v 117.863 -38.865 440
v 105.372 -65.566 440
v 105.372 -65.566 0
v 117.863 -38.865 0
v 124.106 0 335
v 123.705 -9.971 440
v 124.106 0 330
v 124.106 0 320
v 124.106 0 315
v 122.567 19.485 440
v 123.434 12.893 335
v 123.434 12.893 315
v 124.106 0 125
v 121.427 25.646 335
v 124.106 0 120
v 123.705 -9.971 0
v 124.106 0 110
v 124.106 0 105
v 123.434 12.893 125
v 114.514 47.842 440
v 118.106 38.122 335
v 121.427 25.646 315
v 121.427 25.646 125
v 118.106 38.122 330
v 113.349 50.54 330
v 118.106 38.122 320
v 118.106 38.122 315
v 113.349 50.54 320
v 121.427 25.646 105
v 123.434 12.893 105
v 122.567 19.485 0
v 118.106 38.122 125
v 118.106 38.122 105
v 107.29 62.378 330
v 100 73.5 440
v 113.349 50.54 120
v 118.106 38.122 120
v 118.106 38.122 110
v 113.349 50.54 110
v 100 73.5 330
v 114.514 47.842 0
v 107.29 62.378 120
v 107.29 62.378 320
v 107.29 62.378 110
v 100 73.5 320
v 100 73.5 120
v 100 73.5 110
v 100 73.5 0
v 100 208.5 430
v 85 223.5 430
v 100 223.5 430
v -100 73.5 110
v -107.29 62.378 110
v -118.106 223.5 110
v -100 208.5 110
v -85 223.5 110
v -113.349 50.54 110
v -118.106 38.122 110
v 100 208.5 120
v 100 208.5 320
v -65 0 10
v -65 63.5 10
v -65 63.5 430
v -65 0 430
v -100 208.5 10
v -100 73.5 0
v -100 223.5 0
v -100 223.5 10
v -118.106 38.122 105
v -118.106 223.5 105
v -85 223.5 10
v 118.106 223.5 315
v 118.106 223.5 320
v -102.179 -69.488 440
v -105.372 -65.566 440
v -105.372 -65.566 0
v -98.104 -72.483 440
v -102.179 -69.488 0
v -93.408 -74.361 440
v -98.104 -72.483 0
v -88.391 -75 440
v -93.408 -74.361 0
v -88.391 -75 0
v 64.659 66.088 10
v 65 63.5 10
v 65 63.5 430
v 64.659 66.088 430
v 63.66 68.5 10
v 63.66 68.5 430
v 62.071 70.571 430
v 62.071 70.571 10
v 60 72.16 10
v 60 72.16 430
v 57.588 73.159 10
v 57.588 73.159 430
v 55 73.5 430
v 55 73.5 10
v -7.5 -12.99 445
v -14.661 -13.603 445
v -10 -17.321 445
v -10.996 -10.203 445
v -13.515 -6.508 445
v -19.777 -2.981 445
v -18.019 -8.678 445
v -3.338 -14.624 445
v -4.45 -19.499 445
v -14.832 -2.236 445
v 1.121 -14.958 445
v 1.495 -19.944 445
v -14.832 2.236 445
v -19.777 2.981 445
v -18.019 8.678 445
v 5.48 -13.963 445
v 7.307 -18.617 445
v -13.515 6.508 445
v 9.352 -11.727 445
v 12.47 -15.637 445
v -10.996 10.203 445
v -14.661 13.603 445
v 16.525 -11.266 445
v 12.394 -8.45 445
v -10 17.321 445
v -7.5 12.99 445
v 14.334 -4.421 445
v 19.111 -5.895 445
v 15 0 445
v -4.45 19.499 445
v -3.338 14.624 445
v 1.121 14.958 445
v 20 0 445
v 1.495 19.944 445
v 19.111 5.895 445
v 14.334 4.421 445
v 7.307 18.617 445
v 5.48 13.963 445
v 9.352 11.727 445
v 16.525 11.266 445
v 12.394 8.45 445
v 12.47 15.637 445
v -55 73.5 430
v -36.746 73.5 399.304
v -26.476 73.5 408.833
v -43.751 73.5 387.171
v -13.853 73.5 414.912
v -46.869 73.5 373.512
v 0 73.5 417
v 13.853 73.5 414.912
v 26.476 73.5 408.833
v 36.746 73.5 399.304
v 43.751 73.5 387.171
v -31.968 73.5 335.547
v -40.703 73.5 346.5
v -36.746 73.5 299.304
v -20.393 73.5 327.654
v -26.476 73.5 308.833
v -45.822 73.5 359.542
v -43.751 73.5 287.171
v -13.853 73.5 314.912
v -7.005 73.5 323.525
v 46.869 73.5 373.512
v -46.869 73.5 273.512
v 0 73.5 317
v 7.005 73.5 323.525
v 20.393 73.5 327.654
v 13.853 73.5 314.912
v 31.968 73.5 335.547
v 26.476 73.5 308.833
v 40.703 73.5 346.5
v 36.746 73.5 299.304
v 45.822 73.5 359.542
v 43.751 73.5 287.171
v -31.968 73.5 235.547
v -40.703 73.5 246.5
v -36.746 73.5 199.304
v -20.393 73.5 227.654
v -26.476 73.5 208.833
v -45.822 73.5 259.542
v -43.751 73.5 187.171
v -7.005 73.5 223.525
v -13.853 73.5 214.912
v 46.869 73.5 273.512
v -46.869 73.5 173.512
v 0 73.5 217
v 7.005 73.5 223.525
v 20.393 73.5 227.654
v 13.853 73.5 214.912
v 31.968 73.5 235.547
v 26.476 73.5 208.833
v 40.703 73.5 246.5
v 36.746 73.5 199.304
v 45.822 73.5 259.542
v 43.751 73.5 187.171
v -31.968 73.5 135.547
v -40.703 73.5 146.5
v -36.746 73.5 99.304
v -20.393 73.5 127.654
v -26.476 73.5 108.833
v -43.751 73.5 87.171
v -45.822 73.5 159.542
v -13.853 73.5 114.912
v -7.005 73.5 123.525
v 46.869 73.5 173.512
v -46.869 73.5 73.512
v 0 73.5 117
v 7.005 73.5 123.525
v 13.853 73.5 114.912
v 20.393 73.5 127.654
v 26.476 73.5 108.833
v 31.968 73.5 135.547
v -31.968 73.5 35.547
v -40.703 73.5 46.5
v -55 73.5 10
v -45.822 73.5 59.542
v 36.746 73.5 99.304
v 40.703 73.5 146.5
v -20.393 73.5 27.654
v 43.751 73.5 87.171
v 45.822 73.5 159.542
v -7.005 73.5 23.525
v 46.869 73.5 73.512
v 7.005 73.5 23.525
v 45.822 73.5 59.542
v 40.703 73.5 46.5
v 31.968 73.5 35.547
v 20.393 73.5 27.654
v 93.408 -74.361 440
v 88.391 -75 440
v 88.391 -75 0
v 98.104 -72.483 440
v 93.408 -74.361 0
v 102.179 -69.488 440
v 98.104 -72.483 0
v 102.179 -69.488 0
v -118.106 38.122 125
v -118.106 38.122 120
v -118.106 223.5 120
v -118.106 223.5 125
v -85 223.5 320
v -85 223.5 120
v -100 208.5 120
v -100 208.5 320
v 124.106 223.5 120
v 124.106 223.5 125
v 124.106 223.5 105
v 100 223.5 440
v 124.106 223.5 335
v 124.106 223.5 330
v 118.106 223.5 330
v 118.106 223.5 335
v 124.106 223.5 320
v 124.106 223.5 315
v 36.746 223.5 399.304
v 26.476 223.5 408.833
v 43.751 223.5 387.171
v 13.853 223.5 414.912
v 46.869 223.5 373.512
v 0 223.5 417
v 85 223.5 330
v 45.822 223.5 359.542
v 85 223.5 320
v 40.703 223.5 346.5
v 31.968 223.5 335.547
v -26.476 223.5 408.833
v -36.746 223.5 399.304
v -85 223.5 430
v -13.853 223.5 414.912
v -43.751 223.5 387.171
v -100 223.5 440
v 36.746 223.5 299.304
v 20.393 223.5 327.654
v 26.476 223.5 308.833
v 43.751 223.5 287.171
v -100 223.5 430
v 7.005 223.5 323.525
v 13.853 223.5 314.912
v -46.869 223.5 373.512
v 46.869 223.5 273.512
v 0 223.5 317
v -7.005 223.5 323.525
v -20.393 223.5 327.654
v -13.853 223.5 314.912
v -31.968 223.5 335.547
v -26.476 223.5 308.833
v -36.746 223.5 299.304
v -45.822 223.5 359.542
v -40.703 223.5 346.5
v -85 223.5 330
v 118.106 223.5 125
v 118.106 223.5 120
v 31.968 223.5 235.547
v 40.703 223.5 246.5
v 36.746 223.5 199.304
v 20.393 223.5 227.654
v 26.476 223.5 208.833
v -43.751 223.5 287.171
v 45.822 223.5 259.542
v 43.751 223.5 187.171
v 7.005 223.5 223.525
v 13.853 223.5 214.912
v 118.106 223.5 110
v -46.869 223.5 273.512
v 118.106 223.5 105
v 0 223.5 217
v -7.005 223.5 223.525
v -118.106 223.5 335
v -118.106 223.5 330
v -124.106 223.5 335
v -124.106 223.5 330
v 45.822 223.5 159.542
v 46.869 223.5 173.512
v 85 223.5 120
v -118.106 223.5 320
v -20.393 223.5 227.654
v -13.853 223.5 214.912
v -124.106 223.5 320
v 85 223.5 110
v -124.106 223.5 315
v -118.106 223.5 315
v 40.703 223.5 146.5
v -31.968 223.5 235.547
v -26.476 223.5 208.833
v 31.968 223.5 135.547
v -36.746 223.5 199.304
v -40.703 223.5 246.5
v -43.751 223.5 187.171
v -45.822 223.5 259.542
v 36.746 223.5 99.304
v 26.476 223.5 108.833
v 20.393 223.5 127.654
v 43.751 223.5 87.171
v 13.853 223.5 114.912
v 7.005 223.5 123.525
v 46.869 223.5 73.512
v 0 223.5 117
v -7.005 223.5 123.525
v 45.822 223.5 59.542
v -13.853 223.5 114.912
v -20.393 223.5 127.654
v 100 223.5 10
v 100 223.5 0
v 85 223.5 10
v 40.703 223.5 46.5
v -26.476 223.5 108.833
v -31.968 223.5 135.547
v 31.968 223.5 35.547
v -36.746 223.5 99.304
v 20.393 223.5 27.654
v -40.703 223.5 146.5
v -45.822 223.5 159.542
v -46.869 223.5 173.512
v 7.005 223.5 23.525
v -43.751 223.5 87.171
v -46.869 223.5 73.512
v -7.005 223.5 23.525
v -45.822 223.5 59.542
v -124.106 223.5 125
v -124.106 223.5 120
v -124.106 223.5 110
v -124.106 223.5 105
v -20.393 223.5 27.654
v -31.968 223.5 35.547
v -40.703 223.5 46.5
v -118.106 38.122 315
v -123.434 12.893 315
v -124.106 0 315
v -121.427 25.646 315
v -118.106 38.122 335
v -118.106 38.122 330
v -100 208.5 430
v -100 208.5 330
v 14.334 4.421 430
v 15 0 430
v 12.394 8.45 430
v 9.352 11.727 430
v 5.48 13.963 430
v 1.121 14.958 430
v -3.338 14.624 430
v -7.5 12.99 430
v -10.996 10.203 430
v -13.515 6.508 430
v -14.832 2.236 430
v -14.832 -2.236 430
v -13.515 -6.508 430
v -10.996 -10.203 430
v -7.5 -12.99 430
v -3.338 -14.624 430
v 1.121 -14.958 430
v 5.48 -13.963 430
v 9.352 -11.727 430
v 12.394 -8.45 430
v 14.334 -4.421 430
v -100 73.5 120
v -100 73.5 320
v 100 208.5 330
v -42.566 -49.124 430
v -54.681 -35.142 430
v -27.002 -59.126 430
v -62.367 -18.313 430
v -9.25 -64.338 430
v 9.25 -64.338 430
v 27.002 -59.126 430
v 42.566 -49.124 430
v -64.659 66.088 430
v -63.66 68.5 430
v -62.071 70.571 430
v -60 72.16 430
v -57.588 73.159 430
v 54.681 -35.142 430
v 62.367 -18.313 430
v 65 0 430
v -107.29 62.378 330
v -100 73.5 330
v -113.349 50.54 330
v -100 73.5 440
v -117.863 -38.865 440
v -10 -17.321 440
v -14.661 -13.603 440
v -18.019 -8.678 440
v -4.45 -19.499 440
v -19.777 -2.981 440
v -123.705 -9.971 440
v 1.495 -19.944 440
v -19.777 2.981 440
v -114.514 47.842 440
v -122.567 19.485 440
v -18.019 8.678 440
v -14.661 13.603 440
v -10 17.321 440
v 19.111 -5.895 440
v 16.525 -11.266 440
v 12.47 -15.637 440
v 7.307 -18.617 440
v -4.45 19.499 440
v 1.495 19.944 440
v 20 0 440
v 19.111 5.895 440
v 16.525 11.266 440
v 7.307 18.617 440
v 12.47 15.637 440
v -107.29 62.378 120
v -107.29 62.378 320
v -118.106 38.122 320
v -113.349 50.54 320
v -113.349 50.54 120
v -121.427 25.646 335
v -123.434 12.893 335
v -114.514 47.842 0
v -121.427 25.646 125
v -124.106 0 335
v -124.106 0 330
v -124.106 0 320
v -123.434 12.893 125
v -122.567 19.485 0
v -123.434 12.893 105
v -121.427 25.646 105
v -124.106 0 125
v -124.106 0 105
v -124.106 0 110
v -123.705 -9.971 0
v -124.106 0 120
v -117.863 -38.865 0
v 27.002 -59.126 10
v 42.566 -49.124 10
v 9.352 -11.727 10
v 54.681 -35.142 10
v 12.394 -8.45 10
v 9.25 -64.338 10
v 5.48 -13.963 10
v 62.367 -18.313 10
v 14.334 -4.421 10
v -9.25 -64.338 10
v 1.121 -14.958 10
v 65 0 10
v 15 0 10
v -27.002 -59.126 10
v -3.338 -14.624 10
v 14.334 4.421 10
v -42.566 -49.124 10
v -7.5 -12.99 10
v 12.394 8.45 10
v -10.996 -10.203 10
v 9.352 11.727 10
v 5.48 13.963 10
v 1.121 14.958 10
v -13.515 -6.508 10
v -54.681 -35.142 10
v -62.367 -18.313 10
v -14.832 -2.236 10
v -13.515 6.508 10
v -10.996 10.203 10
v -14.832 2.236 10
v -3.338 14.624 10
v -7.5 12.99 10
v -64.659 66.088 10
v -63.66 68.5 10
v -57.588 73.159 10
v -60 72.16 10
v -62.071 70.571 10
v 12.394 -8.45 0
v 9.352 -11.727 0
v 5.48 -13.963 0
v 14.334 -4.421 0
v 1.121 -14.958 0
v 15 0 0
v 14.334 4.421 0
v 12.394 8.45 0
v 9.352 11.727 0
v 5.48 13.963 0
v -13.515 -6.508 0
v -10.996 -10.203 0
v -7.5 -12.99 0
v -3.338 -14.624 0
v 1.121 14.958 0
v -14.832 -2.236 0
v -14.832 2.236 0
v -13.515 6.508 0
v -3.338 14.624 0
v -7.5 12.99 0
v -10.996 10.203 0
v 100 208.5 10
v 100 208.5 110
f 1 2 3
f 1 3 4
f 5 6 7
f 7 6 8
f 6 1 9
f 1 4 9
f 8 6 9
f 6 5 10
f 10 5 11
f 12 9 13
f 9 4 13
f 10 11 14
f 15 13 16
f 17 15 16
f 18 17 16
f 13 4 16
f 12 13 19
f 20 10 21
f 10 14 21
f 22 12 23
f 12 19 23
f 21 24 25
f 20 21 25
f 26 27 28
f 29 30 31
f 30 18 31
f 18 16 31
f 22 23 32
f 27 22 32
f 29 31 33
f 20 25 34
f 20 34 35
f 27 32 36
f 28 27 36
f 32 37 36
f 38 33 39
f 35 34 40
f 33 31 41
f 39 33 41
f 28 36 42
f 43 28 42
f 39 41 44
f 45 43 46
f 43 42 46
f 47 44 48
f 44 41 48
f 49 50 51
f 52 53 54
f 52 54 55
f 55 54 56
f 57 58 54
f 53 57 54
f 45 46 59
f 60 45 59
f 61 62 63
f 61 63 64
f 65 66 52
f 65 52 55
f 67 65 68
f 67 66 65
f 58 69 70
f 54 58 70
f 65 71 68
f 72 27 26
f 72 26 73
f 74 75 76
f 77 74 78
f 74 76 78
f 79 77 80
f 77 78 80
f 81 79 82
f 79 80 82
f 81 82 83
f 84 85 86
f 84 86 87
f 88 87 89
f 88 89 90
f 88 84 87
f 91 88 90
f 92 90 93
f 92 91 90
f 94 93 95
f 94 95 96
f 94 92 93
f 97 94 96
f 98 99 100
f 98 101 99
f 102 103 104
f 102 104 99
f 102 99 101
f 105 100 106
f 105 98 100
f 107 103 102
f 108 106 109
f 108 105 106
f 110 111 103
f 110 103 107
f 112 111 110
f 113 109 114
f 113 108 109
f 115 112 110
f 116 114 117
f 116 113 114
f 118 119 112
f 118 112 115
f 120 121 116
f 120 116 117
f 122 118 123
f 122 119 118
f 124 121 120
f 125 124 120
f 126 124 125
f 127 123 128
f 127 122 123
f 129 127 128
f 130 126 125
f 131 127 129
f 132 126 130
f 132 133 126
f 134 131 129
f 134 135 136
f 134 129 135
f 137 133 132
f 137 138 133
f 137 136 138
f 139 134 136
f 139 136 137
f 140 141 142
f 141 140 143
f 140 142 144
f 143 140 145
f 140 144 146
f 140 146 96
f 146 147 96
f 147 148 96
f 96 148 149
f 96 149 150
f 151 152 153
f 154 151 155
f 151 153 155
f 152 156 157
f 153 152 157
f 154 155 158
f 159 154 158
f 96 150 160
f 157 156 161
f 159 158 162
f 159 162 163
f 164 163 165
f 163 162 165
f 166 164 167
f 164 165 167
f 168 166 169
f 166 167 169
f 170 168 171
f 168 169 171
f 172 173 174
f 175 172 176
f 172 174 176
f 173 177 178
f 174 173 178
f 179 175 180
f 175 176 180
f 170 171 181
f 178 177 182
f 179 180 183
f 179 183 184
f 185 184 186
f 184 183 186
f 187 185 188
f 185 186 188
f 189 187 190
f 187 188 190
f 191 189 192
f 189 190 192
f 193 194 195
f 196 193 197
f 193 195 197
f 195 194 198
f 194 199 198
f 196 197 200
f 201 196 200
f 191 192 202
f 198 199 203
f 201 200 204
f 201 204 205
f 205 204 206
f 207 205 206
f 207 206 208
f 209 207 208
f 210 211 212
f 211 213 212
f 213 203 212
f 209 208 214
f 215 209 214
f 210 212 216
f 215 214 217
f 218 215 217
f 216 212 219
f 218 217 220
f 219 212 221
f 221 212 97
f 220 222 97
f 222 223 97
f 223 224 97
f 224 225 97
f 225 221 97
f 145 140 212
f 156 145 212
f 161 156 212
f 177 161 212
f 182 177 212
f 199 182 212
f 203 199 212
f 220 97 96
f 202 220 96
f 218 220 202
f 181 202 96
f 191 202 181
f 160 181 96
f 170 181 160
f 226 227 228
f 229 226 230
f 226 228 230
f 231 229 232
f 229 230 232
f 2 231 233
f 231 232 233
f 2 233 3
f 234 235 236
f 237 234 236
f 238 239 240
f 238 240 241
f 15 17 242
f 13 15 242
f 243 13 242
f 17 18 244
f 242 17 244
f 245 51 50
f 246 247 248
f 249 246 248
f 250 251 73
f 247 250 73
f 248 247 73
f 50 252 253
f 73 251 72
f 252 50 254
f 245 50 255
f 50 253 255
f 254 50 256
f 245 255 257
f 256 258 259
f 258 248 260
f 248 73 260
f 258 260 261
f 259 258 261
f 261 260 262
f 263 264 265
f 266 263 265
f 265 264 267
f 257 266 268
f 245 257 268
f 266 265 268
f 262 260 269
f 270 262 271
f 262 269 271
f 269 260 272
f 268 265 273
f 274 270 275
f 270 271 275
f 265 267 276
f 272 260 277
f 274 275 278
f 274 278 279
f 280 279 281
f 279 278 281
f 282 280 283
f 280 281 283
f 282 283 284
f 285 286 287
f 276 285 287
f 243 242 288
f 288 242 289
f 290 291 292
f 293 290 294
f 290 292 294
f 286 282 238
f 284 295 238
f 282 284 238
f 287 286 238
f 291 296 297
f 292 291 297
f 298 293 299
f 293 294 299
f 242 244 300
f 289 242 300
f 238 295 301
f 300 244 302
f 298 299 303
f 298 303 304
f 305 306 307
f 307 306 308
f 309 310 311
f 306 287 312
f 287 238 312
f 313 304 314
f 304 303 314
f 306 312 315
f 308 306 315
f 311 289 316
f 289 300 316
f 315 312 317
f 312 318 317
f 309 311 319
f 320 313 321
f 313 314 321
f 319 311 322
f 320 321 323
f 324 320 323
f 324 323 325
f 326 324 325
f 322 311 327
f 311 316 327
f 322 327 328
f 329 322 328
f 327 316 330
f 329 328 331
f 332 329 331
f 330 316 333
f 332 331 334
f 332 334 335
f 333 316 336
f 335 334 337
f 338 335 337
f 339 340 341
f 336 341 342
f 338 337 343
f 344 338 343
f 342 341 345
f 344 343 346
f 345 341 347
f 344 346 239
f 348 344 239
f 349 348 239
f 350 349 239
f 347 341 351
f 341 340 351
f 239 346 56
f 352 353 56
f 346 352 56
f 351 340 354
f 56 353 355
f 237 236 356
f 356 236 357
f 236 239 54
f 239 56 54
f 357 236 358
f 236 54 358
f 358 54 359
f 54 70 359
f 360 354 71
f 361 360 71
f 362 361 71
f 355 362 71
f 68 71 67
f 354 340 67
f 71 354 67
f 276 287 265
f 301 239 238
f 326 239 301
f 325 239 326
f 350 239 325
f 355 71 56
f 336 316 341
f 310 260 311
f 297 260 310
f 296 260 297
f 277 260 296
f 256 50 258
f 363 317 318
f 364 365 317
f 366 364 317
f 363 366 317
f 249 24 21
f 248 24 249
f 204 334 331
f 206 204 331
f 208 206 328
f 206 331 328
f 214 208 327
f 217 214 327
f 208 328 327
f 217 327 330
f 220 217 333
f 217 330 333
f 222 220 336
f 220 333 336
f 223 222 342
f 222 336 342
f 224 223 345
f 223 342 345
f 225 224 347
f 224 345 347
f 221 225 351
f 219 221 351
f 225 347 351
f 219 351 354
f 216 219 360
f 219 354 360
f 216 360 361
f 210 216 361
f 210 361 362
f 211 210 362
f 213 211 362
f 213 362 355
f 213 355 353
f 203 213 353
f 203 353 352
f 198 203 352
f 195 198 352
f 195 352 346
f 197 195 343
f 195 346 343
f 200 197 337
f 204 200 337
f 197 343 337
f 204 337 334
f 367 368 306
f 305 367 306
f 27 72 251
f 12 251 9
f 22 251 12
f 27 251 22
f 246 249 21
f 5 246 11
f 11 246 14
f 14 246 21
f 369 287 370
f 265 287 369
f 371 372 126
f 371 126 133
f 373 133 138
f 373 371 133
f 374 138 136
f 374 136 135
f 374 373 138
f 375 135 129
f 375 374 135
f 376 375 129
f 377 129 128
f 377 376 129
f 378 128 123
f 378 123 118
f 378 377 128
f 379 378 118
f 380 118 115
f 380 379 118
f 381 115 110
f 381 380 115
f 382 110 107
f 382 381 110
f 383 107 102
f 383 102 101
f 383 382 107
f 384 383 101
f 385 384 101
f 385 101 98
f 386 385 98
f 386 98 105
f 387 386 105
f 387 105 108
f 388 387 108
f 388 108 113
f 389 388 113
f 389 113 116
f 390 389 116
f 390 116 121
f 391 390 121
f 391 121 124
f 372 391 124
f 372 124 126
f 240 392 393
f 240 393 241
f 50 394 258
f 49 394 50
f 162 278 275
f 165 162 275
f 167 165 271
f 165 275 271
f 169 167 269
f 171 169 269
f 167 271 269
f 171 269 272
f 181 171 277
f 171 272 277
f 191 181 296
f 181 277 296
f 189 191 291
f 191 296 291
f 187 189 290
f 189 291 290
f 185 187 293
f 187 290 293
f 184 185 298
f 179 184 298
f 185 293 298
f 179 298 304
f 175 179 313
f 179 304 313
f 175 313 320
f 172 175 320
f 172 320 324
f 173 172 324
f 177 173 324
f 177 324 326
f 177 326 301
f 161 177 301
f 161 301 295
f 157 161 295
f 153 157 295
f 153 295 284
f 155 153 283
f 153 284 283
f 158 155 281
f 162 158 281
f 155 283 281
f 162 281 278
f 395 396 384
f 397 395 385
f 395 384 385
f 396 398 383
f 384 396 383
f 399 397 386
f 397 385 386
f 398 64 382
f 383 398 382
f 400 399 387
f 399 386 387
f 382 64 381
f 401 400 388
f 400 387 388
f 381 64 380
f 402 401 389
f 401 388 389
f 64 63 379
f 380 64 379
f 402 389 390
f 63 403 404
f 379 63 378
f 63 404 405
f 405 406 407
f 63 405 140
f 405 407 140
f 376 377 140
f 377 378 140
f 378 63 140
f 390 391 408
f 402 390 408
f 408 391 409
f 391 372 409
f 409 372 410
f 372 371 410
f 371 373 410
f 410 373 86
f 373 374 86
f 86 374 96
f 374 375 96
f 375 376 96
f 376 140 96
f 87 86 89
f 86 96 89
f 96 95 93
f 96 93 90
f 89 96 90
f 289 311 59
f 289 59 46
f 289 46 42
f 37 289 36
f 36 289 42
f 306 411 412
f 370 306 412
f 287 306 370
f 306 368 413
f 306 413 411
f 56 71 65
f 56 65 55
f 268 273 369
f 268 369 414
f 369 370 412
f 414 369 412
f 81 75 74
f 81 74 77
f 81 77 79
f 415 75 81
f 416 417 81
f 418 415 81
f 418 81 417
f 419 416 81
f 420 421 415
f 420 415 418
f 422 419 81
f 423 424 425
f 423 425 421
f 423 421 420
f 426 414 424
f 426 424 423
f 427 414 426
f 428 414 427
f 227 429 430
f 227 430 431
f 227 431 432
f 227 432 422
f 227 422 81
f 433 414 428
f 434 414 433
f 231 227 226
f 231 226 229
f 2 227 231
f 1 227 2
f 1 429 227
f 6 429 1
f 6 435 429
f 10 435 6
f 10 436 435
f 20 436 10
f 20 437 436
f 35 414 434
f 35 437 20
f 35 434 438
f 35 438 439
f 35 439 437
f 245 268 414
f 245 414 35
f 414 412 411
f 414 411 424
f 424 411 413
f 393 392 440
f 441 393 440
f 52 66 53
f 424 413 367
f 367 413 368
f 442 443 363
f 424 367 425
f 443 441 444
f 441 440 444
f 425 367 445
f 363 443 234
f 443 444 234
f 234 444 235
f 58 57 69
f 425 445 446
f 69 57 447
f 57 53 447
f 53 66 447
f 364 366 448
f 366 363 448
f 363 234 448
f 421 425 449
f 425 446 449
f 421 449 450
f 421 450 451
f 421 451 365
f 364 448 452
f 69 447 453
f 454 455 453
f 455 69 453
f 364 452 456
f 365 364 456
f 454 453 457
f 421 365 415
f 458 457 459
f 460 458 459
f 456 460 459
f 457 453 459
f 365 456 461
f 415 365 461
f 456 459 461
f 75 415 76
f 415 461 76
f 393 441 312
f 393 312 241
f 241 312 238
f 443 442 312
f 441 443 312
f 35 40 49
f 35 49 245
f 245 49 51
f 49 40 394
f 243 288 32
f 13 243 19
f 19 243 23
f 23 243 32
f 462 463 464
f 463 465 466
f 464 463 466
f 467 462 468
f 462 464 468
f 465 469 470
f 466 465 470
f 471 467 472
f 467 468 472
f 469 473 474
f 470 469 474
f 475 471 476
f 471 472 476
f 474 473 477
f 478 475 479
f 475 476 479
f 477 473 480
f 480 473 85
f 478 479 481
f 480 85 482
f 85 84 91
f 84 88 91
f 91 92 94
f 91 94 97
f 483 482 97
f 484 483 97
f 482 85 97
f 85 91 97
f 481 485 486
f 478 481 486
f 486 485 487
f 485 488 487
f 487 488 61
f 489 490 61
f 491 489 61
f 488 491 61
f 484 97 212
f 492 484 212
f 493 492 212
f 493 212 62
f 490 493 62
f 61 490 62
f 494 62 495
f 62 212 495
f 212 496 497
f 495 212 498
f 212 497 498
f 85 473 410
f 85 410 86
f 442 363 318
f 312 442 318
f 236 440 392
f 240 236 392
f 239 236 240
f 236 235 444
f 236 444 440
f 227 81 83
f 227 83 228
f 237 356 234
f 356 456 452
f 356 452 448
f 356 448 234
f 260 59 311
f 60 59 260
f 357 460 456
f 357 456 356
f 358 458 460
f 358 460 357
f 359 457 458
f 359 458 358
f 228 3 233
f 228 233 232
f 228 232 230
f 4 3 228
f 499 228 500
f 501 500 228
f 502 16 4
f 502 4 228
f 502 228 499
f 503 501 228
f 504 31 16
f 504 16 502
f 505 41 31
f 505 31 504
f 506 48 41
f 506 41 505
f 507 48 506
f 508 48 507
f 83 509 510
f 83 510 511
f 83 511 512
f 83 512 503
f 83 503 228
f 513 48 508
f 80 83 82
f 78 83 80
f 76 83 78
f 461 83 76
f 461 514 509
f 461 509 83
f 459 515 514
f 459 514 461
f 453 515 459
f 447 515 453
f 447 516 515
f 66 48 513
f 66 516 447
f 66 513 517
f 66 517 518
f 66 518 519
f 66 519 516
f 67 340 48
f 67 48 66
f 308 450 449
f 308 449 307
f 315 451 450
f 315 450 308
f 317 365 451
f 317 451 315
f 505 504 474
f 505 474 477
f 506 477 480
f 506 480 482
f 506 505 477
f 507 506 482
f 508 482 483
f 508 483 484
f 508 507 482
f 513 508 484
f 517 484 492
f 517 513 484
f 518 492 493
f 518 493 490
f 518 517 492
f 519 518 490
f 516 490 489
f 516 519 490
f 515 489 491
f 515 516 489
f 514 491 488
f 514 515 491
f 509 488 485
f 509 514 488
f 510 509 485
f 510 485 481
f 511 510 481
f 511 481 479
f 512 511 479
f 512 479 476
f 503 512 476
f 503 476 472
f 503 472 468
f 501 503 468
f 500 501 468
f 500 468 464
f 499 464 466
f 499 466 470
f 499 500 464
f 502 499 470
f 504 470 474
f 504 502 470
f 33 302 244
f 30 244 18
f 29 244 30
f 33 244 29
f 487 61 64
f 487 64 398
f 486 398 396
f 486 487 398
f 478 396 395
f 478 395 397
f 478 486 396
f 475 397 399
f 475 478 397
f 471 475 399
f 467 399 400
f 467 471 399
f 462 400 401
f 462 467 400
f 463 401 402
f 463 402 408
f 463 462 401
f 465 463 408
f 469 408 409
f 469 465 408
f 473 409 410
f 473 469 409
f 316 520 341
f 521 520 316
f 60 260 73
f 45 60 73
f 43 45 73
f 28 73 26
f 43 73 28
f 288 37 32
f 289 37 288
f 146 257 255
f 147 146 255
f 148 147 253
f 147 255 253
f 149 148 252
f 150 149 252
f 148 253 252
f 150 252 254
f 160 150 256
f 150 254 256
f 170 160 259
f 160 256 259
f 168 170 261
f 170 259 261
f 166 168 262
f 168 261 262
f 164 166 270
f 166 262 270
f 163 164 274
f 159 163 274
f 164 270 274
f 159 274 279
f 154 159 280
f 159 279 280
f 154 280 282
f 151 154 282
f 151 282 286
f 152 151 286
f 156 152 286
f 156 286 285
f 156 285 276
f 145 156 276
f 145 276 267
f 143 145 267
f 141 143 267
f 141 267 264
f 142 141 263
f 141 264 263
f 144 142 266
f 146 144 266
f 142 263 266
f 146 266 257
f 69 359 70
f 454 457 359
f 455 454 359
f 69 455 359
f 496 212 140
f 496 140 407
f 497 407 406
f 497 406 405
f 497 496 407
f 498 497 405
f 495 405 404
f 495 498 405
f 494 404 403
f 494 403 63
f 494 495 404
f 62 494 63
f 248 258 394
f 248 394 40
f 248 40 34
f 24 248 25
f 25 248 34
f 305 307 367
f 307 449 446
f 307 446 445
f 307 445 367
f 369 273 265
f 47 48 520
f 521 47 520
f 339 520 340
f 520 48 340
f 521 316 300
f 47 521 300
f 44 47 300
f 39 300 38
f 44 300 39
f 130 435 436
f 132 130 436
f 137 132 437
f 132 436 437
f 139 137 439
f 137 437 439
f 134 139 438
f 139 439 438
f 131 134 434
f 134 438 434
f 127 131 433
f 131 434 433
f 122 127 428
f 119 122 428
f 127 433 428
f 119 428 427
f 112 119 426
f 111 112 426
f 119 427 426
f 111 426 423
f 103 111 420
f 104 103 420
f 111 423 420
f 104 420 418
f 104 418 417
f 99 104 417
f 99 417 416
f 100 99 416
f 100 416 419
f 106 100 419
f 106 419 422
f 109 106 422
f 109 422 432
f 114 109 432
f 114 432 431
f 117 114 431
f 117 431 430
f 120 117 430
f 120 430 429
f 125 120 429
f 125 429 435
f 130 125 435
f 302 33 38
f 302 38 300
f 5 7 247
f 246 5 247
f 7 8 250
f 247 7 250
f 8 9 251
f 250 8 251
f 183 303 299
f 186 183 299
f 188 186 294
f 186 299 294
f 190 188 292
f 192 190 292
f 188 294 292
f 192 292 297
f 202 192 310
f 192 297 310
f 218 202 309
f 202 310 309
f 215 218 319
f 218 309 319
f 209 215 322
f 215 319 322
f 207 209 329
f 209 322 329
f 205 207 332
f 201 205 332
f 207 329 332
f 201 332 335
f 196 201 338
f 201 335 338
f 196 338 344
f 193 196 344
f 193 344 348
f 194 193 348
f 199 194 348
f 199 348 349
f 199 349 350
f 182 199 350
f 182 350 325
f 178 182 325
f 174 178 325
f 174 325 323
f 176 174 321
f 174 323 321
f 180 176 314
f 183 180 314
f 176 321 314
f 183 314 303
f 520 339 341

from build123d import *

# Parameters (mm, degrees)
SKETCH1_R                = 15
BOSS_EXTRUDE1_DEPTH      = 10
SKETCH2_W                = 200
SKETCH2_H                = 150
BOSS_EXTRUDE2_DEPTH      = 420
SKETCH3_R                = 47
CUT_EXTRUDE1_DEPTH       = 150
CHAMFER2_SIZE            = 15
BOSS_EXTRUDE3_START      = 10
BOSS_EXTRUDE3_DEPTH      = 420
BOSS_EXTRUDE4_DEPTH      = 5
BOSS_EXTRUDE4_DEPTH_BACK = 5
BOSS_EXTRUDE4_START      = 115
SKETCH5_W                = 39.105801637
SKETCH5_H                = 223.5
BOSS_EXTRUDE5_DEPTH      = 5
BOSS_EXTRUDE5_DEPTH_BACK = 5
BOSS_EXTRUDE5_START      = 325
SKETCH5_3_W              = 39.105801637
SKETCH5_3_H              = 223.5
BOSS_EXTRUDE6_DEPTH      = 10
BOSS_EXTRUDE6_DEPTH_BACK = 10
BOSS_EXTRUDE6_START      = 115
SKETCH5_4_W              = 6
SKETCH5_4_H              = 223.5
BOSS_EXTRUDE7_DEPTH      = 10
BOSS_EXTRUDE7_DEPTH_BACK = 10
BOSS_EXTRUDE7_START      = 325
SKETCH5_5_W              = 6
SKETCH5_5_H              = 223.5
SKETCH10_R               = 15
BOSS_EXTRUDE8_DEPTH      = 10
SKETCH10_3_R             = 20
SKETCH10_3_R_2           = 15
BOSS_EXTRUDE9_DEPTH      = 15


with BuildPart() as part:
    # Sketch1 → Boss-Extrude1 (new body)
    with BuildSketch(Plane.XY):
        with BuildLine():
            Line((-100, 223.5), (-100, 73.5))
            ThreePointArc((-100, 73.5), (-124.013298207, 4.790810776), (-105.372324855, -65.566173861))
            ThreePointArc((-105.372324855, -65.566173861), (-98.104066029, -72.483184453), (-88.39127748, -75))
            Line((-88.39127748, -75), (88.39127748, -75))
            ThreePointArc((88.39127748, -75), (98.104066029, -72.483184453), (105.372324855, -65.566173861))
            ThreePointArc((105.372324855, -65.566173861), (124.013298207, 4.790810776), (100, 73.5))
            Line((100, 73.5), (100, 223.5))
            Line((100, 223.5), (-100, 223.5))
        make_face()
        Circle(SKETCH1_R, mode=Mode.SUBTRACT)
    extrude(amount=BOSS_EXTRUDE1_DEPTH)



with BuildPart() as body_2:
    # Sketch2 → Boss-Extrude2 (new body)
    with BuildSketch(Plane.XY.offset(10)):
        with Locations((0, 148.5)):
            Rectangle(SKETCH2_W, SKETCH2_H)
    extrude(amount=BOSS_EXTRUDE2_DEPTH)

    # Sketch3 → Cut-Extrude1 (cut)
    with BuildSketch(Plane(origin=(0, 223.5, 0), x_dir=(1, 0, 0), z_dir=(0, 1, 0))):
        with Locations((0, -370)):
            Circle(SKETCH3_R)
        with Locations((0, -270)):
            Circle(SKETCH3_R)
        with Locations((0, -170)):
            Circle(SKETCH3_R)
        with Locations((0, -70)):
            Circle(SKETCH3_R)
    extrude(amount=-CUT_EXTRUDE1_DEPTH, mode=Mode.SUBTRACT)

    # Chamfer2
    chamfer2_edges = [body_2.edges().sort_by_distance(p)[0] for p in [
        (-100, 223.5, 220),
        (100, 223.5, 220),
    ]]
    chamfer(chamfer2_edges, length=CHAMFER2_SIZE)


with BuildPart() as part_1:
    add(part.part)

    add(body_2.part)  # Boss-Extrude3 merges body 2
    # Sketch4 → Boss-Extrude3 (add)
    with BuildSketch(Plane.XY.offset(BOSS_EXTRUDE3_START)):
        with BuildLine():
            Line((88.39127748, -75), (-88.39127748, -75))
            ThreePointArc((-88.39127748, -75), (-98.104066029, -72.483184453), (-105.372324855, -65.566173861))
            ThreePointArc((-105.372324855, -65.566173861), (-124.013298207, 4.790810776), (-100, 73.5))
            Line((-100, 73.5), (-55, 73.5))
            ThreePointArc((-55, 73.5), (-62.071067812, 70.571067812), (-65, 63.5))
            Line((-65, 63.5), (-65, 0))
            ThreePointArc((-65, 0), (0, -65), (65, 0))
            Line((65, 0), (65, 63.5))
            ThreePointArc((65, 63.5), (62.071067812, 70.571067812), (55, 73.5))
            Line((55, 73.5), (100, 73.5))
            ThreePointArc((100, 73.5), (124.013298207, 4.790810776), (105.372324855, -65.566173861))
            ThreePointArc((105.372324855, -65.566173861), (98.104066029, -72.483184453), (88.39127748, -75))
        make_face()
    extrude(amount=BOSS_EXTRUDE3_DEPTH)

    # Sketch5 → Boss-Extrude4 (add, two sides: drawn at the far end of the back side and taken through both)
    with BuildSketch(Plane.XY.offset(BOSS_EXTRUDE4_START - BOSS_EXTRUDE4_DEPTH_BACK)):
        with Locations((-104.552900819, 111.75)):
            Rectangle(SKETCH5_W, SKETCH5_H)
        with Locations((104.552900819, 111.75)):
            Rectangle(SKETCH5_W, SKETCH5_H)
    extrude(amount=BOSS_EXTRUDE4_DEPTH + BOSS_EXTRUDE4_DEPTH_BACK)

    # Sketch5<3> → Boss-Extrude5 (add, two sides: drawn at the far end of the back side and taken through both)
    with BuildSketch(Plane.XY.offset(BOSS_EXTRUDE5_START - BOSS_EXTRUDE5_DEPTH_BACK)):
        with Locations((-104.552900819, 111.75)):
            Rectangle(SKETCH5_3_W, SKETCH5_3_H)
        with Locations((104.552900819, 111.75)):
            Rectangle(SKETCH5_3_W, SKETCH5_3_H)
    extrude(amount=BOSS_EXTRUDE5_DEPTH + BOSS_EXTRUDE5_DEPTH_BACK)

    # Sketch5<4> → Boss-Extrude6 (add, two sides: drawn at the far end of the back side and taken through both)
    with BuildSketch(Plane.XY.offset(BOSS_EXTRUDE6_START - BOSS_EXTRUDE6_DEPTH_BACK)):
        with Locations((-121.105801637, 111.75)):
            Rectangle(SKETCH5_4_W, SKETCH5_4_H)
        with Locations((121.105801637, 111.75)):
            Rectangle(SKETCH5_4_W, SKETCH5_4_H)
    extrude(amount=BOSS_EXTRUDE6_DEPTH + BOSS_EXTRUDE6_DEPTH_BACK)

    # Sketch5<5> → Boss-Extrude7 (add, two sides: drawn at the far end of the back side and taken through both)
    with BuildSketch(Plane.XY.offset(BOSS_EXTRUDE7_START - BOSS_EXTRUDE7_DEPTH_BACK)):
        with Locations((-121.105801637, 111.75)):
            Rectangle(SKETCH5_5_W, SKETCH5_5_H)
        with Locations((121.105801637, 111.75)):
            Rectangle(SKETCH5_5_W, SKETCH5_5_H)
    extrude(amount=BOSS_EXTRUDE7_DEPTH + BOSS_EXTRUDE7_DEPTH_BACK)

    # Sketch10 → Boss-Extrude8 (add)
    with BuildSketch(Plane.XY.offset(430)):
        with BuildLine():
            Line((100, 223.5), (-100, 223.5))
            Line((-100, 223.5), (-100, 73.5))
            ThreePointArc((-100, 73.5), (-124.013298207, 4.790810776), (-105.372324855, -65.566173861))
            ThreePointArc((-105.372324855, -65.566173861), (-98.104066029, -72.483184453), (-88.39127748, -75))
            Line((-88.39127748, -75), (88.39127748, -75))
            ThreePointArc((88.39127748, -75), (98.104066029, -72.483184453), (105.372324855, -65.566173861))
            ThreePointArc((105.372324855, -65.566173861), (124.013298207, 4.790810776), (100, 73.5))
            Line((100, 73.5), (100, 223.5))
        make_face()
        Circle(SKETCH10_R, mode=Mode.SUBTRACT)
    extrude(amount=BOSS_EXTRUDE8_DEPTH)

    # Sketch10<3> → Boss-Extrude9 (add)
    with BuildSketch(Plane.XY.offset(430)):
        Circle(SKETCH10_3_R)
        Circle(SKETCH10_3_R_2, mode=Mode.SUBTRACT)
    extrude(amount=BOSS_EXTRUDE9_DEPTH)


solid = part_1.part
